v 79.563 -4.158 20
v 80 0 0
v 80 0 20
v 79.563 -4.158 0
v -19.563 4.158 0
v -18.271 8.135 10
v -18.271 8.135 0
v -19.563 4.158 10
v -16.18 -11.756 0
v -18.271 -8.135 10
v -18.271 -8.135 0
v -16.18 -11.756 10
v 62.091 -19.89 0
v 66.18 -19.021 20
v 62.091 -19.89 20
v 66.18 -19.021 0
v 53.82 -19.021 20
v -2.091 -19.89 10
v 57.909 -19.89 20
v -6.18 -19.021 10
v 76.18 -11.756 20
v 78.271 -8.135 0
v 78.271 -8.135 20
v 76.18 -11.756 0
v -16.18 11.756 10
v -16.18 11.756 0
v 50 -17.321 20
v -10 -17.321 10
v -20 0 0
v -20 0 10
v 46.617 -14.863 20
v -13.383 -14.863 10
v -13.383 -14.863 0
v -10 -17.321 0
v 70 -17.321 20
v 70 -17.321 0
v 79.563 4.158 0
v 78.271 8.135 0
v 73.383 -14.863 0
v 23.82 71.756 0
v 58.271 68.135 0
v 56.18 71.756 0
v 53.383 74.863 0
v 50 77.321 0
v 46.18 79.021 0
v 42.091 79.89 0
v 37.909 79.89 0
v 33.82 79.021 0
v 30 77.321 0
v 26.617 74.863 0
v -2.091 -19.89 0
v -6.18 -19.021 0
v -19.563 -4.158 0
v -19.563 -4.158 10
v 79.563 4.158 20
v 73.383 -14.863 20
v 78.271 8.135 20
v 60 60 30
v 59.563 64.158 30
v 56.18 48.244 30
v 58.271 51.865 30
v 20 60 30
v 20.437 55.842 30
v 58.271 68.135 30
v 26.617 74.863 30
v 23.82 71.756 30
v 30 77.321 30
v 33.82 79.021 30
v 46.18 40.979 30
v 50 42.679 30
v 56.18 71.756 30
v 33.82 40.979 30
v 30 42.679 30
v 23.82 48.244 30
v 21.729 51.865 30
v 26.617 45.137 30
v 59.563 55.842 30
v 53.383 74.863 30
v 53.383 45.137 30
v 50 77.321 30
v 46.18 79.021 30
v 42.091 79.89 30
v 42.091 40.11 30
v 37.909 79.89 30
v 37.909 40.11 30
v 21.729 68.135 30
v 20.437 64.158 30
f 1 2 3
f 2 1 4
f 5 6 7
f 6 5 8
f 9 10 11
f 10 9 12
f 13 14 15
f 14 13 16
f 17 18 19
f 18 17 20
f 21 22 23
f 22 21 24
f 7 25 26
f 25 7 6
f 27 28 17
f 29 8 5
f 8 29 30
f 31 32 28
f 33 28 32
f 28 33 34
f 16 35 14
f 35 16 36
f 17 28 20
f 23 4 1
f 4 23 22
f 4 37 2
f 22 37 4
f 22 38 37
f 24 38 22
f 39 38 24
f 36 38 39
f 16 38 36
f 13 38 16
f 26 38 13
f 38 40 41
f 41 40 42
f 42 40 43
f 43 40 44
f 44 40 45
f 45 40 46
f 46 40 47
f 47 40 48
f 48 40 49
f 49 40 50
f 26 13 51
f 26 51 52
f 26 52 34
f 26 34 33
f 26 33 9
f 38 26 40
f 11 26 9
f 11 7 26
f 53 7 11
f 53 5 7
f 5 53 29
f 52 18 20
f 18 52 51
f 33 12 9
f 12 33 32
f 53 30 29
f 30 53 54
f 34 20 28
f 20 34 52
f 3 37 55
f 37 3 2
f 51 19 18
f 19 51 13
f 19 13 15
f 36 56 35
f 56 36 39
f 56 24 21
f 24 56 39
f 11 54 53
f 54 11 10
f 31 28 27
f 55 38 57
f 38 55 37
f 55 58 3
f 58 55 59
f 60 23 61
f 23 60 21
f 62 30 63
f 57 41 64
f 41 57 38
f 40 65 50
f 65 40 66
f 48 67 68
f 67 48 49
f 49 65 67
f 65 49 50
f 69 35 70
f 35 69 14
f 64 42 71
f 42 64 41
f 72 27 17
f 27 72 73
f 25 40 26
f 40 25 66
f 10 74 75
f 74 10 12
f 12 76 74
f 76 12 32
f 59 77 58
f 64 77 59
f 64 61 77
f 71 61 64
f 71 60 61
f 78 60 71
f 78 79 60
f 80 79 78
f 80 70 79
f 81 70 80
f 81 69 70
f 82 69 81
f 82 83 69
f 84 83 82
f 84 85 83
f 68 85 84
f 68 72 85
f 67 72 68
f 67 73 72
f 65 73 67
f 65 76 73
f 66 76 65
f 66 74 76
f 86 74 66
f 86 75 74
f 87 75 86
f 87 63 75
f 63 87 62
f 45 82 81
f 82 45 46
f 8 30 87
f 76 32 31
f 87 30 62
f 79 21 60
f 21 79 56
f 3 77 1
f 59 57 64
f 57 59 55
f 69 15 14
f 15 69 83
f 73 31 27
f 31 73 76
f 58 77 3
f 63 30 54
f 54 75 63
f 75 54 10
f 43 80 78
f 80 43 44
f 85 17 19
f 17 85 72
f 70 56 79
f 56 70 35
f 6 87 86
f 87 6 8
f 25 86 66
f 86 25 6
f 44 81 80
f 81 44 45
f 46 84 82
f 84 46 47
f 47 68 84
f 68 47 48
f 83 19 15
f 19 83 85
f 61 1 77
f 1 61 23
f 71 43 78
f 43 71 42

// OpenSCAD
module placa_snowboard(grosime, raza, lungime)
{

cylinder(h=grosime, r=raza);

translate([lungime-2*raza,0,0]) 
    cylinder(h=grosime, r=raza);
translate([0,-raza,0])
    cube([lungime-2*raza, 2*raza, grosime]);
}
placa_snowboard(grosime=10, raza=20, lungime=100);


//--------
module placa_snowboard(grosime, raza, lungime)
{
    hull() {
cylinder(h=grosime, r=raza);

translate([lungime-2*raza,0,0]) 
    cylinder(h=2*grosime, r=raza);
    }

}
//---------------------------

module podium(grosime, raza, lungime)
{
    hull() {
cylinder(h=grosime, r=raza);

translate([lungime-2*raza,0,0]) 
    cylinder(h=2*grosime, r=raza);
translate([(lungime-raza)/2, lungime-2*raza,0])        
        cylinder(h=3*grosime, r=raza); 
        
    }

}
//-----------------------
//placa_snowboard2(grosime=10, raza=20, lungime=100);
podium(grosime=10, raza=20, lungime=100);
